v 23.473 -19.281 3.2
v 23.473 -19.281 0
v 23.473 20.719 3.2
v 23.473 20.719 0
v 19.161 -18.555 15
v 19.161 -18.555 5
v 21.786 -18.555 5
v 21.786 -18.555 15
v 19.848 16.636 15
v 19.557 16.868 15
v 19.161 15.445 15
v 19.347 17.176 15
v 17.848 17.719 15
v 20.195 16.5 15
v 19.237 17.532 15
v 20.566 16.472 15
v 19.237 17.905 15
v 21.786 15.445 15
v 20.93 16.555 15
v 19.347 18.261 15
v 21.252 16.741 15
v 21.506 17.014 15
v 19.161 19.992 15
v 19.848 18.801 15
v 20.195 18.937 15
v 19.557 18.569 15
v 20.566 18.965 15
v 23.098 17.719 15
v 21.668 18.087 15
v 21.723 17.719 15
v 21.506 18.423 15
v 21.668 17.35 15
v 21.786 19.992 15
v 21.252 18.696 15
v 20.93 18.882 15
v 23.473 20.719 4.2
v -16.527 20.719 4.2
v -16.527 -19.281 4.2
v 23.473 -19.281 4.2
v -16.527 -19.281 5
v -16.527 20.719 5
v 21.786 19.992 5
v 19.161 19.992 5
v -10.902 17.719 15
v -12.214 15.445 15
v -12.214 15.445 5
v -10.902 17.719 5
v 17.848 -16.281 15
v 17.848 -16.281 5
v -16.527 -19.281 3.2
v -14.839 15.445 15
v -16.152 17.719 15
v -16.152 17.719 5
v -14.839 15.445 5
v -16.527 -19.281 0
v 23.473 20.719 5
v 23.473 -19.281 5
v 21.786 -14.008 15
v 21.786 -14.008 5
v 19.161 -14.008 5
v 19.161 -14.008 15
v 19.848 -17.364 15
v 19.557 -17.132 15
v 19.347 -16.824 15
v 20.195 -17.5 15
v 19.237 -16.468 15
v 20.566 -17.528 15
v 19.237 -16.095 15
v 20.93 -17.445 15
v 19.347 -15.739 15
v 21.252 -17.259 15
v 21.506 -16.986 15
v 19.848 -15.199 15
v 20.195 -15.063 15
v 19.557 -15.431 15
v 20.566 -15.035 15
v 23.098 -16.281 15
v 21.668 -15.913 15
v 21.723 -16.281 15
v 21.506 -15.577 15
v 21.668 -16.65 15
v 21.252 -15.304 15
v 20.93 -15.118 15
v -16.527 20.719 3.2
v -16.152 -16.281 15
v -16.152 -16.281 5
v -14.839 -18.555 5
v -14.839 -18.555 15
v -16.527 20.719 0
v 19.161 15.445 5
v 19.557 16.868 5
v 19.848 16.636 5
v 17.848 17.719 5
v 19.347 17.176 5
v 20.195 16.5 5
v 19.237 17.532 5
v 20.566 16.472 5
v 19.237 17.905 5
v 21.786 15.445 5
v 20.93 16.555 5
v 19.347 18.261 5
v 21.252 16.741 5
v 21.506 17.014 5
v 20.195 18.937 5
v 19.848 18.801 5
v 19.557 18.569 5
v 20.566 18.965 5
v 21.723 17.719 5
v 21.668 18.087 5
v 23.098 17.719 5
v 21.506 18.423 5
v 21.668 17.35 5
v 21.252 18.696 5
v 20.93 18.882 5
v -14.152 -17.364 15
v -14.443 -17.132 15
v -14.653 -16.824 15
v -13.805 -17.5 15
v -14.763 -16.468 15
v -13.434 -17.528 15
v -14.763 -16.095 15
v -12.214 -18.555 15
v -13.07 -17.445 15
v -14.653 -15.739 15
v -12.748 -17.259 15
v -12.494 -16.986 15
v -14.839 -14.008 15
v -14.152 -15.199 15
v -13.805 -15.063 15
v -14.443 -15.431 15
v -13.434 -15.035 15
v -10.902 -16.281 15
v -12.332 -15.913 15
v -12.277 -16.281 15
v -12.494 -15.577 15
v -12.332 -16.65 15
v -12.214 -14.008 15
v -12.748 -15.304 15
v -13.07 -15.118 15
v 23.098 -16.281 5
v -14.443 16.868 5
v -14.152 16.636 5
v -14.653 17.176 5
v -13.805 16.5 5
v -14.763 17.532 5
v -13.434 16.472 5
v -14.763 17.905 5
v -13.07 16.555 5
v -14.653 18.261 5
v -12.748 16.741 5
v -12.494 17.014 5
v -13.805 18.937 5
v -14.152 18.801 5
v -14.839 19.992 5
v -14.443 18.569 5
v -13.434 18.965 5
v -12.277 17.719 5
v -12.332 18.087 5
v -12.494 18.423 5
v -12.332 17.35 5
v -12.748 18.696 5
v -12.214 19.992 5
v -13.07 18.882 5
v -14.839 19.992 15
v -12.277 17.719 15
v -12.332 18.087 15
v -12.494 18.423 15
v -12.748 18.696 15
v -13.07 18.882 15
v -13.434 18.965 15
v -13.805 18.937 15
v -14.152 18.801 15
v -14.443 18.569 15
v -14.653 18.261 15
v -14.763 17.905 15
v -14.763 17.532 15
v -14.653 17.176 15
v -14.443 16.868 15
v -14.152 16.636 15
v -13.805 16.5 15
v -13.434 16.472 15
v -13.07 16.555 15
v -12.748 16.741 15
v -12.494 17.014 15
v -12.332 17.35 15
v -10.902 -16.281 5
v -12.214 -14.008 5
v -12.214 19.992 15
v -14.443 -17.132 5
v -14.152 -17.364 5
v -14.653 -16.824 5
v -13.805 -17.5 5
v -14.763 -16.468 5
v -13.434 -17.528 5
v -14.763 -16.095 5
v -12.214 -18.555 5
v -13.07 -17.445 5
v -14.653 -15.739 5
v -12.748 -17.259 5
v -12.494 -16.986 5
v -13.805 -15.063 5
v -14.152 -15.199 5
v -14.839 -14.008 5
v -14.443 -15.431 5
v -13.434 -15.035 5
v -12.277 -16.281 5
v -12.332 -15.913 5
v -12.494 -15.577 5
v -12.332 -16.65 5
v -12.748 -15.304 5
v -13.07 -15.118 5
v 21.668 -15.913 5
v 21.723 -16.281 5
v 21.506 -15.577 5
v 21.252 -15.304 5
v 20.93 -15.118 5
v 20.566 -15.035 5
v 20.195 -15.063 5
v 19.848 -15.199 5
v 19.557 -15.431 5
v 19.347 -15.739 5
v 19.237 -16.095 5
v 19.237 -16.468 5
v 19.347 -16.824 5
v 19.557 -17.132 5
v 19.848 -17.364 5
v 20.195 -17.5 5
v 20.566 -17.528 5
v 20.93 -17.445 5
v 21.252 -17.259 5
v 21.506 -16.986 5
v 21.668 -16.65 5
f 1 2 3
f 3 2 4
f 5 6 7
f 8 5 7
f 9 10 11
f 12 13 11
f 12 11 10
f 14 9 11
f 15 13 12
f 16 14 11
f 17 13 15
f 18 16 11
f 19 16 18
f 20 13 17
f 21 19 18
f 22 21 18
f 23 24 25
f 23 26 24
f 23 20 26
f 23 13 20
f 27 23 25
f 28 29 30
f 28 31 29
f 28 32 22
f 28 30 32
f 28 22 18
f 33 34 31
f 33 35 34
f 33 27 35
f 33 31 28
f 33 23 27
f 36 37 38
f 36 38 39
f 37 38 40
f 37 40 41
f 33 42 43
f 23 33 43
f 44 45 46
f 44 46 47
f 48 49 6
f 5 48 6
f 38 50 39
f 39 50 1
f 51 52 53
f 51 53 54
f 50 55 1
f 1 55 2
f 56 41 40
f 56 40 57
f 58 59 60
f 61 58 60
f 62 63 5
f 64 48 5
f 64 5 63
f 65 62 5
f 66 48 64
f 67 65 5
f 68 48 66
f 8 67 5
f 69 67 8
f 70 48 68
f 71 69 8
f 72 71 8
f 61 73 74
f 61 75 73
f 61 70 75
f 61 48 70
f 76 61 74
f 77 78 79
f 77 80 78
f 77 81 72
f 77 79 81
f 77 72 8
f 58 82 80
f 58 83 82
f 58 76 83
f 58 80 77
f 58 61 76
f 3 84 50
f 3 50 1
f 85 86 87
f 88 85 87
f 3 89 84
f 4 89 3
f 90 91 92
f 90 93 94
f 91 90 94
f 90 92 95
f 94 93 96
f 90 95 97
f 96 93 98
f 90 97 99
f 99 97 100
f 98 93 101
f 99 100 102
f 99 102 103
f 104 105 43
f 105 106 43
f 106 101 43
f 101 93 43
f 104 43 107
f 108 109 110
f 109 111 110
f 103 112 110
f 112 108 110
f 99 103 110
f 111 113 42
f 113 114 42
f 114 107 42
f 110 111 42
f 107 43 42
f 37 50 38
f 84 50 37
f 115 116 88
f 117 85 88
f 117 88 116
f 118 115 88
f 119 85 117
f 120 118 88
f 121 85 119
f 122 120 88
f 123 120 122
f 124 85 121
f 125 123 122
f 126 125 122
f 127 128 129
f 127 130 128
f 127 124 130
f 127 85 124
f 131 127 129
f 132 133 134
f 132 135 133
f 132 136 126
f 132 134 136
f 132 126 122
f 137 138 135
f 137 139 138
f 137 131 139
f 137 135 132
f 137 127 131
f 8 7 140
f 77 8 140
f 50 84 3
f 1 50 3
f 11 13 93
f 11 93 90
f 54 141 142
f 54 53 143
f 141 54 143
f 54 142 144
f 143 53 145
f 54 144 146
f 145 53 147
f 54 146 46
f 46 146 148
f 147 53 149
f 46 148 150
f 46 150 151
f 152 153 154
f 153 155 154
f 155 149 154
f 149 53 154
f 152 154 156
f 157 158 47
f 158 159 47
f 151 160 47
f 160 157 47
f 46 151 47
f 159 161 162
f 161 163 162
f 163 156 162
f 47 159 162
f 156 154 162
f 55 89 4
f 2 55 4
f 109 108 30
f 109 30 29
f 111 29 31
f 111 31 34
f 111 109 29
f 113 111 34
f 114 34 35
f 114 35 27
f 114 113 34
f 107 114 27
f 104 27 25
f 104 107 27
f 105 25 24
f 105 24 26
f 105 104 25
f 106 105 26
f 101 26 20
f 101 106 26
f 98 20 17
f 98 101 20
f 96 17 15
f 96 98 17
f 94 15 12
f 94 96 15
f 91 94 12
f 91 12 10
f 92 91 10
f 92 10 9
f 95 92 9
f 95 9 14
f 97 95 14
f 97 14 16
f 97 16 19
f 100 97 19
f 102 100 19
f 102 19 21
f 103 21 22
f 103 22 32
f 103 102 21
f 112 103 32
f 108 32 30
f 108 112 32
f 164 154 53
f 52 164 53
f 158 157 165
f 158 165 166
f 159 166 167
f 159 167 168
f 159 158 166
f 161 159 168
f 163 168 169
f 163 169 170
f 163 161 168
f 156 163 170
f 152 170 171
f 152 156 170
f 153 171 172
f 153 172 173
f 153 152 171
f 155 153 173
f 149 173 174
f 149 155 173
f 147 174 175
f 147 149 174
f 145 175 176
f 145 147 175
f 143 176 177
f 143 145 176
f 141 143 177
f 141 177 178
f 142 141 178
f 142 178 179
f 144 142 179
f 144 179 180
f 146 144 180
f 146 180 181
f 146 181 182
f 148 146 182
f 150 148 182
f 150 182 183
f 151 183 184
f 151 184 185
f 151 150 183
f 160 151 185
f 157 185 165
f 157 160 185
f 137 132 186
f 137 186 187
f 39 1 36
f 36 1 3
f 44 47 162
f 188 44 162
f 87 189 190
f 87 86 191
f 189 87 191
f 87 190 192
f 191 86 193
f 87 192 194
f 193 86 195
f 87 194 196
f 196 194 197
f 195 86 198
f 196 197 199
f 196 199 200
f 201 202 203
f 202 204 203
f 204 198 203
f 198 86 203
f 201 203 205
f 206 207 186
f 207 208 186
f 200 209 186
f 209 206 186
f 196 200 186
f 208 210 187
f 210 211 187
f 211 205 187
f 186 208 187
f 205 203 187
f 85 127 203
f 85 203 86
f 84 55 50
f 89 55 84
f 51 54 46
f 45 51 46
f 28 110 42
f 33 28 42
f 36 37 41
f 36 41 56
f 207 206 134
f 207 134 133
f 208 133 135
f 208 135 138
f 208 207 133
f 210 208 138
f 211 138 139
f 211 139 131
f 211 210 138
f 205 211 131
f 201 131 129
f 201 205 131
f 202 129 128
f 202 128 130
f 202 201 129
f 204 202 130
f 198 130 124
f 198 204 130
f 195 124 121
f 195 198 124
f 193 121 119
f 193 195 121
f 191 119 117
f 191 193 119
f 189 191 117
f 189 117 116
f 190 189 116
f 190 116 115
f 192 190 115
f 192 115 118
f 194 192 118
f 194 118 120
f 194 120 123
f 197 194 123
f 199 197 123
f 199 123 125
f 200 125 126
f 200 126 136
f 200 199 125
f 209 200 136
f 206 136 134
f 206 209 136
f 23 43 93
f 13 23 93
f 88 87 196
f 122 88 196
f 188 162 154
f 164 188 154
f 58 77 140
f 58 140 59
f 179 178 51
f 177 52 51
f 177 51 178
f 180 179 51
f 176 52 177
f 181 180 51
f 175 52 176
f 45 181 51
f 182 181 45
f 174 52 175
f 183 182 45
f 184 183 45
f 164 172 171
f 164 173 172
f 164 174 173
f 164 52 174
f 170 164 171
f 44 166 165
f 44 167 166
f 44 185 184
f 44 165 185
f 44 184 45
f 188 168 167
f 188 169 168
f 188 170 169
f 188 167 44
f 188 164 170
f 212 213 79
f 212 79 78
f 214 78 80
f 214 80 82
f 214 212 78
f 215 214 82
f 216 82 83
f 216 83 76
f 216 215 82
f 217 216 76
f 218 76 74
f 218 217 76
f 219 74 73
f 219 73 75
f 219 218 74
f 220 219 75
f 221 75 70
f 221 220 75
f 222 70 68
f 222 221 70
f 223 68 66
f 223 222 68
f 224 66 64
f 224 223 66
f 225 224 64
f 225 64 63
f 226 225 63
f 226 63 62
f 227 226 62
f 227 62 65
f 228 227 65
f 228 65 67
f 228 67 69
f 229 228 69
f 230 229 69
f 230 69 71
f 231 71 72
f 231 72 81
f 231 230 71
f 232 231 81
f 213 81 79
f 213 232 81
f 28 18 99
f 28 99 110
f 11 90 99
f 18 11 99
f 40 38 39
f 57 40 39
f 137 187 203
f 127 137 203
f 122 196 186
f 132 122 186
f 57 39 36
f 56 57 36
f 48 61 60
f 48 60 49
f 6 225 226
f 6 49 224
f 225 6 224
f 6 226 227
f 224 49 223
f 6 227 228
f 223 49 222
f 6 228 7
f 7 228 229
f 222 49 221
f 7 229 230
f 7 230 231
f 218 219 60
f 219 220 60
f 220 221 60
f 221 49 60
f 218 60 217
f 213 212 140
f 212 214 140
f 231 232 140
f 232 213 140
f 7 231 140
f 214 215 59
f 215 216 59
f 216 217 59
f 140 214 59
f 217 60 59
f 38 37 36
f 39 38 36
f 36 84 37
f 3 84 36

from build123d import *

# Parameters (mm, degrees)
SKETCH1_W             = 40
SKETCH1_H             = 40
BOSS_EXTRUDE1_DEPTH   = 3.2
SKETCH2_W             = 40
SKETCH2_H             = 40
BOSS_EXTRUDE2_DEPTH   = 1
SKETCH3_W             = 40
SKETCH3_H             = 40
BOSS_EXTRUDE3_DEPTH   = 0.8
SKETCH4_R             = 1.25
BOSS_EXTRUDE4_DEPTH   = 10
BOSS_EXTRUDE4_2_DEPTH = 10
BOSS_EXTRUDE4_3_DEPTH = 10
BOSS_EXTRUDE4_4_DEPTH = 10


with BuildPart() as part:
    # Sketch1 → Boss-Extrude1 (new body)
    with BuildSketch(Plane.XY):
        with Locations((3.473053892, 0.718562874)):
            Rectangle(SKETCH1_W, SKETCH1_H)
    extrude(amount=BOSS_EXTRUDE1_DEPTH)


with BuildPart() as body_2:
    # Sketch2 → Boss-Extrude2 (new body)
    with BuildSketch(Plane.XY.offset(3.2)):
        with Locations((3.473053892, 0.718562874)):
            Rectangle(SKETCH2_W, SKETCH2_H)
    extrude(amount=BOSS_EXTRUDE2_DEPTH)


with BuildPart() as body_3:
    # Sketch3 → Boss-Extrude3 (new body)
    with BuildSketch(Plane.XY.offset(4.2)):
        with Locations((3.473053892, 0.718562874)):
            Rectangle(SKETCH3_W, SKETCH3_H)
    extrude(amount=BOSS_EXTRUDE3_DEPTH)


with BuildPart() as body_4:
    # Sketch4 → Boss-Extrude4 (new body)
    with BuildSketch(Plane.XY.offset(5)):
        Polygon((-10.901946108, 17.718562874), (-12.214446108, 19.991879559), (-14.839446108, 19.991879559), (-16.151946108, 17.718562874), (-14.839446108, 15.445246189), (-12.214446108, 15.445246189), align=None)
        with Locations((-13.526946108, 17.718562874)):
            Circle(SKETCH4_R, mode=Mode.SUBTRACT)
    extrude(amount=BOSS_EXTRUDE4_DEPTH)


with BuildPart() as body_5:
    # Sketch4 → Boss-Extrude4 2 (new body)
    with BuildSketch(Plane.XY.offset(5)):
        Polygon((17.848053892, 17.718562874), (19.160553892, 15.445246189), (21.785553892, 15.445246189), (23.098053892, 17.718562874), (21.785553892, 19.991879559), (19.160553892, 19.991879559), align=None)
        with Locations((20.473053892, 17.718562874)):
            Circle(SKETCH4_R, mode=Mode.SUBTRACT)
    extrude(amount=BOSS_EXTRUDE4_2_DEPTH)


with BuildPart() as body_6:
    # Sketch4 → Boss-Extrude4 3 (new body)
    with BuildSketch(Plane.XY.offset(5)):
        Polygon((-10.901946108, -16.281437126), (-12.214446108, -14.008120441), (-14.839446108, -14.008120441), (-16.151946108, -16.281437126), (-14.839446108, -18.554753811), (-12.214446108, -18.554753811), align=None)
        with Locations((-13.526946108, -16.281437126)):
            Circle(SKETCH4_R, mode=Mode.SUBTRACT)
    extrude(amount=BOSS_EXTRUDE4_3_DEPTH)


with BuildPart() as body_7:
    # Sketch4 → Boss-Extrude4 4 (new body)
    with BuildSketch(Plane.XY.offset(5)):
        Polygon((23.098053892, -16.281437126), (21.785553892, -14.008120441), (19.160553892, -14.008120441), (17.848053892, -16.281437126), (19.160553892, -18.554753811), (21.785553892, -18.554753811), align=None)
        with Locations((20.473053892, -16.281437126)):
            Circle(SKETCH4_R, mode=Mode.SUBTRACT)
    extrude(amount=BOSS_EXTRUDE4_4_DEPTH)


solid = Compound([part.part, body_2.part, body_3.part, body_4.part, body_5.part, body_6.part, body_7.part])
